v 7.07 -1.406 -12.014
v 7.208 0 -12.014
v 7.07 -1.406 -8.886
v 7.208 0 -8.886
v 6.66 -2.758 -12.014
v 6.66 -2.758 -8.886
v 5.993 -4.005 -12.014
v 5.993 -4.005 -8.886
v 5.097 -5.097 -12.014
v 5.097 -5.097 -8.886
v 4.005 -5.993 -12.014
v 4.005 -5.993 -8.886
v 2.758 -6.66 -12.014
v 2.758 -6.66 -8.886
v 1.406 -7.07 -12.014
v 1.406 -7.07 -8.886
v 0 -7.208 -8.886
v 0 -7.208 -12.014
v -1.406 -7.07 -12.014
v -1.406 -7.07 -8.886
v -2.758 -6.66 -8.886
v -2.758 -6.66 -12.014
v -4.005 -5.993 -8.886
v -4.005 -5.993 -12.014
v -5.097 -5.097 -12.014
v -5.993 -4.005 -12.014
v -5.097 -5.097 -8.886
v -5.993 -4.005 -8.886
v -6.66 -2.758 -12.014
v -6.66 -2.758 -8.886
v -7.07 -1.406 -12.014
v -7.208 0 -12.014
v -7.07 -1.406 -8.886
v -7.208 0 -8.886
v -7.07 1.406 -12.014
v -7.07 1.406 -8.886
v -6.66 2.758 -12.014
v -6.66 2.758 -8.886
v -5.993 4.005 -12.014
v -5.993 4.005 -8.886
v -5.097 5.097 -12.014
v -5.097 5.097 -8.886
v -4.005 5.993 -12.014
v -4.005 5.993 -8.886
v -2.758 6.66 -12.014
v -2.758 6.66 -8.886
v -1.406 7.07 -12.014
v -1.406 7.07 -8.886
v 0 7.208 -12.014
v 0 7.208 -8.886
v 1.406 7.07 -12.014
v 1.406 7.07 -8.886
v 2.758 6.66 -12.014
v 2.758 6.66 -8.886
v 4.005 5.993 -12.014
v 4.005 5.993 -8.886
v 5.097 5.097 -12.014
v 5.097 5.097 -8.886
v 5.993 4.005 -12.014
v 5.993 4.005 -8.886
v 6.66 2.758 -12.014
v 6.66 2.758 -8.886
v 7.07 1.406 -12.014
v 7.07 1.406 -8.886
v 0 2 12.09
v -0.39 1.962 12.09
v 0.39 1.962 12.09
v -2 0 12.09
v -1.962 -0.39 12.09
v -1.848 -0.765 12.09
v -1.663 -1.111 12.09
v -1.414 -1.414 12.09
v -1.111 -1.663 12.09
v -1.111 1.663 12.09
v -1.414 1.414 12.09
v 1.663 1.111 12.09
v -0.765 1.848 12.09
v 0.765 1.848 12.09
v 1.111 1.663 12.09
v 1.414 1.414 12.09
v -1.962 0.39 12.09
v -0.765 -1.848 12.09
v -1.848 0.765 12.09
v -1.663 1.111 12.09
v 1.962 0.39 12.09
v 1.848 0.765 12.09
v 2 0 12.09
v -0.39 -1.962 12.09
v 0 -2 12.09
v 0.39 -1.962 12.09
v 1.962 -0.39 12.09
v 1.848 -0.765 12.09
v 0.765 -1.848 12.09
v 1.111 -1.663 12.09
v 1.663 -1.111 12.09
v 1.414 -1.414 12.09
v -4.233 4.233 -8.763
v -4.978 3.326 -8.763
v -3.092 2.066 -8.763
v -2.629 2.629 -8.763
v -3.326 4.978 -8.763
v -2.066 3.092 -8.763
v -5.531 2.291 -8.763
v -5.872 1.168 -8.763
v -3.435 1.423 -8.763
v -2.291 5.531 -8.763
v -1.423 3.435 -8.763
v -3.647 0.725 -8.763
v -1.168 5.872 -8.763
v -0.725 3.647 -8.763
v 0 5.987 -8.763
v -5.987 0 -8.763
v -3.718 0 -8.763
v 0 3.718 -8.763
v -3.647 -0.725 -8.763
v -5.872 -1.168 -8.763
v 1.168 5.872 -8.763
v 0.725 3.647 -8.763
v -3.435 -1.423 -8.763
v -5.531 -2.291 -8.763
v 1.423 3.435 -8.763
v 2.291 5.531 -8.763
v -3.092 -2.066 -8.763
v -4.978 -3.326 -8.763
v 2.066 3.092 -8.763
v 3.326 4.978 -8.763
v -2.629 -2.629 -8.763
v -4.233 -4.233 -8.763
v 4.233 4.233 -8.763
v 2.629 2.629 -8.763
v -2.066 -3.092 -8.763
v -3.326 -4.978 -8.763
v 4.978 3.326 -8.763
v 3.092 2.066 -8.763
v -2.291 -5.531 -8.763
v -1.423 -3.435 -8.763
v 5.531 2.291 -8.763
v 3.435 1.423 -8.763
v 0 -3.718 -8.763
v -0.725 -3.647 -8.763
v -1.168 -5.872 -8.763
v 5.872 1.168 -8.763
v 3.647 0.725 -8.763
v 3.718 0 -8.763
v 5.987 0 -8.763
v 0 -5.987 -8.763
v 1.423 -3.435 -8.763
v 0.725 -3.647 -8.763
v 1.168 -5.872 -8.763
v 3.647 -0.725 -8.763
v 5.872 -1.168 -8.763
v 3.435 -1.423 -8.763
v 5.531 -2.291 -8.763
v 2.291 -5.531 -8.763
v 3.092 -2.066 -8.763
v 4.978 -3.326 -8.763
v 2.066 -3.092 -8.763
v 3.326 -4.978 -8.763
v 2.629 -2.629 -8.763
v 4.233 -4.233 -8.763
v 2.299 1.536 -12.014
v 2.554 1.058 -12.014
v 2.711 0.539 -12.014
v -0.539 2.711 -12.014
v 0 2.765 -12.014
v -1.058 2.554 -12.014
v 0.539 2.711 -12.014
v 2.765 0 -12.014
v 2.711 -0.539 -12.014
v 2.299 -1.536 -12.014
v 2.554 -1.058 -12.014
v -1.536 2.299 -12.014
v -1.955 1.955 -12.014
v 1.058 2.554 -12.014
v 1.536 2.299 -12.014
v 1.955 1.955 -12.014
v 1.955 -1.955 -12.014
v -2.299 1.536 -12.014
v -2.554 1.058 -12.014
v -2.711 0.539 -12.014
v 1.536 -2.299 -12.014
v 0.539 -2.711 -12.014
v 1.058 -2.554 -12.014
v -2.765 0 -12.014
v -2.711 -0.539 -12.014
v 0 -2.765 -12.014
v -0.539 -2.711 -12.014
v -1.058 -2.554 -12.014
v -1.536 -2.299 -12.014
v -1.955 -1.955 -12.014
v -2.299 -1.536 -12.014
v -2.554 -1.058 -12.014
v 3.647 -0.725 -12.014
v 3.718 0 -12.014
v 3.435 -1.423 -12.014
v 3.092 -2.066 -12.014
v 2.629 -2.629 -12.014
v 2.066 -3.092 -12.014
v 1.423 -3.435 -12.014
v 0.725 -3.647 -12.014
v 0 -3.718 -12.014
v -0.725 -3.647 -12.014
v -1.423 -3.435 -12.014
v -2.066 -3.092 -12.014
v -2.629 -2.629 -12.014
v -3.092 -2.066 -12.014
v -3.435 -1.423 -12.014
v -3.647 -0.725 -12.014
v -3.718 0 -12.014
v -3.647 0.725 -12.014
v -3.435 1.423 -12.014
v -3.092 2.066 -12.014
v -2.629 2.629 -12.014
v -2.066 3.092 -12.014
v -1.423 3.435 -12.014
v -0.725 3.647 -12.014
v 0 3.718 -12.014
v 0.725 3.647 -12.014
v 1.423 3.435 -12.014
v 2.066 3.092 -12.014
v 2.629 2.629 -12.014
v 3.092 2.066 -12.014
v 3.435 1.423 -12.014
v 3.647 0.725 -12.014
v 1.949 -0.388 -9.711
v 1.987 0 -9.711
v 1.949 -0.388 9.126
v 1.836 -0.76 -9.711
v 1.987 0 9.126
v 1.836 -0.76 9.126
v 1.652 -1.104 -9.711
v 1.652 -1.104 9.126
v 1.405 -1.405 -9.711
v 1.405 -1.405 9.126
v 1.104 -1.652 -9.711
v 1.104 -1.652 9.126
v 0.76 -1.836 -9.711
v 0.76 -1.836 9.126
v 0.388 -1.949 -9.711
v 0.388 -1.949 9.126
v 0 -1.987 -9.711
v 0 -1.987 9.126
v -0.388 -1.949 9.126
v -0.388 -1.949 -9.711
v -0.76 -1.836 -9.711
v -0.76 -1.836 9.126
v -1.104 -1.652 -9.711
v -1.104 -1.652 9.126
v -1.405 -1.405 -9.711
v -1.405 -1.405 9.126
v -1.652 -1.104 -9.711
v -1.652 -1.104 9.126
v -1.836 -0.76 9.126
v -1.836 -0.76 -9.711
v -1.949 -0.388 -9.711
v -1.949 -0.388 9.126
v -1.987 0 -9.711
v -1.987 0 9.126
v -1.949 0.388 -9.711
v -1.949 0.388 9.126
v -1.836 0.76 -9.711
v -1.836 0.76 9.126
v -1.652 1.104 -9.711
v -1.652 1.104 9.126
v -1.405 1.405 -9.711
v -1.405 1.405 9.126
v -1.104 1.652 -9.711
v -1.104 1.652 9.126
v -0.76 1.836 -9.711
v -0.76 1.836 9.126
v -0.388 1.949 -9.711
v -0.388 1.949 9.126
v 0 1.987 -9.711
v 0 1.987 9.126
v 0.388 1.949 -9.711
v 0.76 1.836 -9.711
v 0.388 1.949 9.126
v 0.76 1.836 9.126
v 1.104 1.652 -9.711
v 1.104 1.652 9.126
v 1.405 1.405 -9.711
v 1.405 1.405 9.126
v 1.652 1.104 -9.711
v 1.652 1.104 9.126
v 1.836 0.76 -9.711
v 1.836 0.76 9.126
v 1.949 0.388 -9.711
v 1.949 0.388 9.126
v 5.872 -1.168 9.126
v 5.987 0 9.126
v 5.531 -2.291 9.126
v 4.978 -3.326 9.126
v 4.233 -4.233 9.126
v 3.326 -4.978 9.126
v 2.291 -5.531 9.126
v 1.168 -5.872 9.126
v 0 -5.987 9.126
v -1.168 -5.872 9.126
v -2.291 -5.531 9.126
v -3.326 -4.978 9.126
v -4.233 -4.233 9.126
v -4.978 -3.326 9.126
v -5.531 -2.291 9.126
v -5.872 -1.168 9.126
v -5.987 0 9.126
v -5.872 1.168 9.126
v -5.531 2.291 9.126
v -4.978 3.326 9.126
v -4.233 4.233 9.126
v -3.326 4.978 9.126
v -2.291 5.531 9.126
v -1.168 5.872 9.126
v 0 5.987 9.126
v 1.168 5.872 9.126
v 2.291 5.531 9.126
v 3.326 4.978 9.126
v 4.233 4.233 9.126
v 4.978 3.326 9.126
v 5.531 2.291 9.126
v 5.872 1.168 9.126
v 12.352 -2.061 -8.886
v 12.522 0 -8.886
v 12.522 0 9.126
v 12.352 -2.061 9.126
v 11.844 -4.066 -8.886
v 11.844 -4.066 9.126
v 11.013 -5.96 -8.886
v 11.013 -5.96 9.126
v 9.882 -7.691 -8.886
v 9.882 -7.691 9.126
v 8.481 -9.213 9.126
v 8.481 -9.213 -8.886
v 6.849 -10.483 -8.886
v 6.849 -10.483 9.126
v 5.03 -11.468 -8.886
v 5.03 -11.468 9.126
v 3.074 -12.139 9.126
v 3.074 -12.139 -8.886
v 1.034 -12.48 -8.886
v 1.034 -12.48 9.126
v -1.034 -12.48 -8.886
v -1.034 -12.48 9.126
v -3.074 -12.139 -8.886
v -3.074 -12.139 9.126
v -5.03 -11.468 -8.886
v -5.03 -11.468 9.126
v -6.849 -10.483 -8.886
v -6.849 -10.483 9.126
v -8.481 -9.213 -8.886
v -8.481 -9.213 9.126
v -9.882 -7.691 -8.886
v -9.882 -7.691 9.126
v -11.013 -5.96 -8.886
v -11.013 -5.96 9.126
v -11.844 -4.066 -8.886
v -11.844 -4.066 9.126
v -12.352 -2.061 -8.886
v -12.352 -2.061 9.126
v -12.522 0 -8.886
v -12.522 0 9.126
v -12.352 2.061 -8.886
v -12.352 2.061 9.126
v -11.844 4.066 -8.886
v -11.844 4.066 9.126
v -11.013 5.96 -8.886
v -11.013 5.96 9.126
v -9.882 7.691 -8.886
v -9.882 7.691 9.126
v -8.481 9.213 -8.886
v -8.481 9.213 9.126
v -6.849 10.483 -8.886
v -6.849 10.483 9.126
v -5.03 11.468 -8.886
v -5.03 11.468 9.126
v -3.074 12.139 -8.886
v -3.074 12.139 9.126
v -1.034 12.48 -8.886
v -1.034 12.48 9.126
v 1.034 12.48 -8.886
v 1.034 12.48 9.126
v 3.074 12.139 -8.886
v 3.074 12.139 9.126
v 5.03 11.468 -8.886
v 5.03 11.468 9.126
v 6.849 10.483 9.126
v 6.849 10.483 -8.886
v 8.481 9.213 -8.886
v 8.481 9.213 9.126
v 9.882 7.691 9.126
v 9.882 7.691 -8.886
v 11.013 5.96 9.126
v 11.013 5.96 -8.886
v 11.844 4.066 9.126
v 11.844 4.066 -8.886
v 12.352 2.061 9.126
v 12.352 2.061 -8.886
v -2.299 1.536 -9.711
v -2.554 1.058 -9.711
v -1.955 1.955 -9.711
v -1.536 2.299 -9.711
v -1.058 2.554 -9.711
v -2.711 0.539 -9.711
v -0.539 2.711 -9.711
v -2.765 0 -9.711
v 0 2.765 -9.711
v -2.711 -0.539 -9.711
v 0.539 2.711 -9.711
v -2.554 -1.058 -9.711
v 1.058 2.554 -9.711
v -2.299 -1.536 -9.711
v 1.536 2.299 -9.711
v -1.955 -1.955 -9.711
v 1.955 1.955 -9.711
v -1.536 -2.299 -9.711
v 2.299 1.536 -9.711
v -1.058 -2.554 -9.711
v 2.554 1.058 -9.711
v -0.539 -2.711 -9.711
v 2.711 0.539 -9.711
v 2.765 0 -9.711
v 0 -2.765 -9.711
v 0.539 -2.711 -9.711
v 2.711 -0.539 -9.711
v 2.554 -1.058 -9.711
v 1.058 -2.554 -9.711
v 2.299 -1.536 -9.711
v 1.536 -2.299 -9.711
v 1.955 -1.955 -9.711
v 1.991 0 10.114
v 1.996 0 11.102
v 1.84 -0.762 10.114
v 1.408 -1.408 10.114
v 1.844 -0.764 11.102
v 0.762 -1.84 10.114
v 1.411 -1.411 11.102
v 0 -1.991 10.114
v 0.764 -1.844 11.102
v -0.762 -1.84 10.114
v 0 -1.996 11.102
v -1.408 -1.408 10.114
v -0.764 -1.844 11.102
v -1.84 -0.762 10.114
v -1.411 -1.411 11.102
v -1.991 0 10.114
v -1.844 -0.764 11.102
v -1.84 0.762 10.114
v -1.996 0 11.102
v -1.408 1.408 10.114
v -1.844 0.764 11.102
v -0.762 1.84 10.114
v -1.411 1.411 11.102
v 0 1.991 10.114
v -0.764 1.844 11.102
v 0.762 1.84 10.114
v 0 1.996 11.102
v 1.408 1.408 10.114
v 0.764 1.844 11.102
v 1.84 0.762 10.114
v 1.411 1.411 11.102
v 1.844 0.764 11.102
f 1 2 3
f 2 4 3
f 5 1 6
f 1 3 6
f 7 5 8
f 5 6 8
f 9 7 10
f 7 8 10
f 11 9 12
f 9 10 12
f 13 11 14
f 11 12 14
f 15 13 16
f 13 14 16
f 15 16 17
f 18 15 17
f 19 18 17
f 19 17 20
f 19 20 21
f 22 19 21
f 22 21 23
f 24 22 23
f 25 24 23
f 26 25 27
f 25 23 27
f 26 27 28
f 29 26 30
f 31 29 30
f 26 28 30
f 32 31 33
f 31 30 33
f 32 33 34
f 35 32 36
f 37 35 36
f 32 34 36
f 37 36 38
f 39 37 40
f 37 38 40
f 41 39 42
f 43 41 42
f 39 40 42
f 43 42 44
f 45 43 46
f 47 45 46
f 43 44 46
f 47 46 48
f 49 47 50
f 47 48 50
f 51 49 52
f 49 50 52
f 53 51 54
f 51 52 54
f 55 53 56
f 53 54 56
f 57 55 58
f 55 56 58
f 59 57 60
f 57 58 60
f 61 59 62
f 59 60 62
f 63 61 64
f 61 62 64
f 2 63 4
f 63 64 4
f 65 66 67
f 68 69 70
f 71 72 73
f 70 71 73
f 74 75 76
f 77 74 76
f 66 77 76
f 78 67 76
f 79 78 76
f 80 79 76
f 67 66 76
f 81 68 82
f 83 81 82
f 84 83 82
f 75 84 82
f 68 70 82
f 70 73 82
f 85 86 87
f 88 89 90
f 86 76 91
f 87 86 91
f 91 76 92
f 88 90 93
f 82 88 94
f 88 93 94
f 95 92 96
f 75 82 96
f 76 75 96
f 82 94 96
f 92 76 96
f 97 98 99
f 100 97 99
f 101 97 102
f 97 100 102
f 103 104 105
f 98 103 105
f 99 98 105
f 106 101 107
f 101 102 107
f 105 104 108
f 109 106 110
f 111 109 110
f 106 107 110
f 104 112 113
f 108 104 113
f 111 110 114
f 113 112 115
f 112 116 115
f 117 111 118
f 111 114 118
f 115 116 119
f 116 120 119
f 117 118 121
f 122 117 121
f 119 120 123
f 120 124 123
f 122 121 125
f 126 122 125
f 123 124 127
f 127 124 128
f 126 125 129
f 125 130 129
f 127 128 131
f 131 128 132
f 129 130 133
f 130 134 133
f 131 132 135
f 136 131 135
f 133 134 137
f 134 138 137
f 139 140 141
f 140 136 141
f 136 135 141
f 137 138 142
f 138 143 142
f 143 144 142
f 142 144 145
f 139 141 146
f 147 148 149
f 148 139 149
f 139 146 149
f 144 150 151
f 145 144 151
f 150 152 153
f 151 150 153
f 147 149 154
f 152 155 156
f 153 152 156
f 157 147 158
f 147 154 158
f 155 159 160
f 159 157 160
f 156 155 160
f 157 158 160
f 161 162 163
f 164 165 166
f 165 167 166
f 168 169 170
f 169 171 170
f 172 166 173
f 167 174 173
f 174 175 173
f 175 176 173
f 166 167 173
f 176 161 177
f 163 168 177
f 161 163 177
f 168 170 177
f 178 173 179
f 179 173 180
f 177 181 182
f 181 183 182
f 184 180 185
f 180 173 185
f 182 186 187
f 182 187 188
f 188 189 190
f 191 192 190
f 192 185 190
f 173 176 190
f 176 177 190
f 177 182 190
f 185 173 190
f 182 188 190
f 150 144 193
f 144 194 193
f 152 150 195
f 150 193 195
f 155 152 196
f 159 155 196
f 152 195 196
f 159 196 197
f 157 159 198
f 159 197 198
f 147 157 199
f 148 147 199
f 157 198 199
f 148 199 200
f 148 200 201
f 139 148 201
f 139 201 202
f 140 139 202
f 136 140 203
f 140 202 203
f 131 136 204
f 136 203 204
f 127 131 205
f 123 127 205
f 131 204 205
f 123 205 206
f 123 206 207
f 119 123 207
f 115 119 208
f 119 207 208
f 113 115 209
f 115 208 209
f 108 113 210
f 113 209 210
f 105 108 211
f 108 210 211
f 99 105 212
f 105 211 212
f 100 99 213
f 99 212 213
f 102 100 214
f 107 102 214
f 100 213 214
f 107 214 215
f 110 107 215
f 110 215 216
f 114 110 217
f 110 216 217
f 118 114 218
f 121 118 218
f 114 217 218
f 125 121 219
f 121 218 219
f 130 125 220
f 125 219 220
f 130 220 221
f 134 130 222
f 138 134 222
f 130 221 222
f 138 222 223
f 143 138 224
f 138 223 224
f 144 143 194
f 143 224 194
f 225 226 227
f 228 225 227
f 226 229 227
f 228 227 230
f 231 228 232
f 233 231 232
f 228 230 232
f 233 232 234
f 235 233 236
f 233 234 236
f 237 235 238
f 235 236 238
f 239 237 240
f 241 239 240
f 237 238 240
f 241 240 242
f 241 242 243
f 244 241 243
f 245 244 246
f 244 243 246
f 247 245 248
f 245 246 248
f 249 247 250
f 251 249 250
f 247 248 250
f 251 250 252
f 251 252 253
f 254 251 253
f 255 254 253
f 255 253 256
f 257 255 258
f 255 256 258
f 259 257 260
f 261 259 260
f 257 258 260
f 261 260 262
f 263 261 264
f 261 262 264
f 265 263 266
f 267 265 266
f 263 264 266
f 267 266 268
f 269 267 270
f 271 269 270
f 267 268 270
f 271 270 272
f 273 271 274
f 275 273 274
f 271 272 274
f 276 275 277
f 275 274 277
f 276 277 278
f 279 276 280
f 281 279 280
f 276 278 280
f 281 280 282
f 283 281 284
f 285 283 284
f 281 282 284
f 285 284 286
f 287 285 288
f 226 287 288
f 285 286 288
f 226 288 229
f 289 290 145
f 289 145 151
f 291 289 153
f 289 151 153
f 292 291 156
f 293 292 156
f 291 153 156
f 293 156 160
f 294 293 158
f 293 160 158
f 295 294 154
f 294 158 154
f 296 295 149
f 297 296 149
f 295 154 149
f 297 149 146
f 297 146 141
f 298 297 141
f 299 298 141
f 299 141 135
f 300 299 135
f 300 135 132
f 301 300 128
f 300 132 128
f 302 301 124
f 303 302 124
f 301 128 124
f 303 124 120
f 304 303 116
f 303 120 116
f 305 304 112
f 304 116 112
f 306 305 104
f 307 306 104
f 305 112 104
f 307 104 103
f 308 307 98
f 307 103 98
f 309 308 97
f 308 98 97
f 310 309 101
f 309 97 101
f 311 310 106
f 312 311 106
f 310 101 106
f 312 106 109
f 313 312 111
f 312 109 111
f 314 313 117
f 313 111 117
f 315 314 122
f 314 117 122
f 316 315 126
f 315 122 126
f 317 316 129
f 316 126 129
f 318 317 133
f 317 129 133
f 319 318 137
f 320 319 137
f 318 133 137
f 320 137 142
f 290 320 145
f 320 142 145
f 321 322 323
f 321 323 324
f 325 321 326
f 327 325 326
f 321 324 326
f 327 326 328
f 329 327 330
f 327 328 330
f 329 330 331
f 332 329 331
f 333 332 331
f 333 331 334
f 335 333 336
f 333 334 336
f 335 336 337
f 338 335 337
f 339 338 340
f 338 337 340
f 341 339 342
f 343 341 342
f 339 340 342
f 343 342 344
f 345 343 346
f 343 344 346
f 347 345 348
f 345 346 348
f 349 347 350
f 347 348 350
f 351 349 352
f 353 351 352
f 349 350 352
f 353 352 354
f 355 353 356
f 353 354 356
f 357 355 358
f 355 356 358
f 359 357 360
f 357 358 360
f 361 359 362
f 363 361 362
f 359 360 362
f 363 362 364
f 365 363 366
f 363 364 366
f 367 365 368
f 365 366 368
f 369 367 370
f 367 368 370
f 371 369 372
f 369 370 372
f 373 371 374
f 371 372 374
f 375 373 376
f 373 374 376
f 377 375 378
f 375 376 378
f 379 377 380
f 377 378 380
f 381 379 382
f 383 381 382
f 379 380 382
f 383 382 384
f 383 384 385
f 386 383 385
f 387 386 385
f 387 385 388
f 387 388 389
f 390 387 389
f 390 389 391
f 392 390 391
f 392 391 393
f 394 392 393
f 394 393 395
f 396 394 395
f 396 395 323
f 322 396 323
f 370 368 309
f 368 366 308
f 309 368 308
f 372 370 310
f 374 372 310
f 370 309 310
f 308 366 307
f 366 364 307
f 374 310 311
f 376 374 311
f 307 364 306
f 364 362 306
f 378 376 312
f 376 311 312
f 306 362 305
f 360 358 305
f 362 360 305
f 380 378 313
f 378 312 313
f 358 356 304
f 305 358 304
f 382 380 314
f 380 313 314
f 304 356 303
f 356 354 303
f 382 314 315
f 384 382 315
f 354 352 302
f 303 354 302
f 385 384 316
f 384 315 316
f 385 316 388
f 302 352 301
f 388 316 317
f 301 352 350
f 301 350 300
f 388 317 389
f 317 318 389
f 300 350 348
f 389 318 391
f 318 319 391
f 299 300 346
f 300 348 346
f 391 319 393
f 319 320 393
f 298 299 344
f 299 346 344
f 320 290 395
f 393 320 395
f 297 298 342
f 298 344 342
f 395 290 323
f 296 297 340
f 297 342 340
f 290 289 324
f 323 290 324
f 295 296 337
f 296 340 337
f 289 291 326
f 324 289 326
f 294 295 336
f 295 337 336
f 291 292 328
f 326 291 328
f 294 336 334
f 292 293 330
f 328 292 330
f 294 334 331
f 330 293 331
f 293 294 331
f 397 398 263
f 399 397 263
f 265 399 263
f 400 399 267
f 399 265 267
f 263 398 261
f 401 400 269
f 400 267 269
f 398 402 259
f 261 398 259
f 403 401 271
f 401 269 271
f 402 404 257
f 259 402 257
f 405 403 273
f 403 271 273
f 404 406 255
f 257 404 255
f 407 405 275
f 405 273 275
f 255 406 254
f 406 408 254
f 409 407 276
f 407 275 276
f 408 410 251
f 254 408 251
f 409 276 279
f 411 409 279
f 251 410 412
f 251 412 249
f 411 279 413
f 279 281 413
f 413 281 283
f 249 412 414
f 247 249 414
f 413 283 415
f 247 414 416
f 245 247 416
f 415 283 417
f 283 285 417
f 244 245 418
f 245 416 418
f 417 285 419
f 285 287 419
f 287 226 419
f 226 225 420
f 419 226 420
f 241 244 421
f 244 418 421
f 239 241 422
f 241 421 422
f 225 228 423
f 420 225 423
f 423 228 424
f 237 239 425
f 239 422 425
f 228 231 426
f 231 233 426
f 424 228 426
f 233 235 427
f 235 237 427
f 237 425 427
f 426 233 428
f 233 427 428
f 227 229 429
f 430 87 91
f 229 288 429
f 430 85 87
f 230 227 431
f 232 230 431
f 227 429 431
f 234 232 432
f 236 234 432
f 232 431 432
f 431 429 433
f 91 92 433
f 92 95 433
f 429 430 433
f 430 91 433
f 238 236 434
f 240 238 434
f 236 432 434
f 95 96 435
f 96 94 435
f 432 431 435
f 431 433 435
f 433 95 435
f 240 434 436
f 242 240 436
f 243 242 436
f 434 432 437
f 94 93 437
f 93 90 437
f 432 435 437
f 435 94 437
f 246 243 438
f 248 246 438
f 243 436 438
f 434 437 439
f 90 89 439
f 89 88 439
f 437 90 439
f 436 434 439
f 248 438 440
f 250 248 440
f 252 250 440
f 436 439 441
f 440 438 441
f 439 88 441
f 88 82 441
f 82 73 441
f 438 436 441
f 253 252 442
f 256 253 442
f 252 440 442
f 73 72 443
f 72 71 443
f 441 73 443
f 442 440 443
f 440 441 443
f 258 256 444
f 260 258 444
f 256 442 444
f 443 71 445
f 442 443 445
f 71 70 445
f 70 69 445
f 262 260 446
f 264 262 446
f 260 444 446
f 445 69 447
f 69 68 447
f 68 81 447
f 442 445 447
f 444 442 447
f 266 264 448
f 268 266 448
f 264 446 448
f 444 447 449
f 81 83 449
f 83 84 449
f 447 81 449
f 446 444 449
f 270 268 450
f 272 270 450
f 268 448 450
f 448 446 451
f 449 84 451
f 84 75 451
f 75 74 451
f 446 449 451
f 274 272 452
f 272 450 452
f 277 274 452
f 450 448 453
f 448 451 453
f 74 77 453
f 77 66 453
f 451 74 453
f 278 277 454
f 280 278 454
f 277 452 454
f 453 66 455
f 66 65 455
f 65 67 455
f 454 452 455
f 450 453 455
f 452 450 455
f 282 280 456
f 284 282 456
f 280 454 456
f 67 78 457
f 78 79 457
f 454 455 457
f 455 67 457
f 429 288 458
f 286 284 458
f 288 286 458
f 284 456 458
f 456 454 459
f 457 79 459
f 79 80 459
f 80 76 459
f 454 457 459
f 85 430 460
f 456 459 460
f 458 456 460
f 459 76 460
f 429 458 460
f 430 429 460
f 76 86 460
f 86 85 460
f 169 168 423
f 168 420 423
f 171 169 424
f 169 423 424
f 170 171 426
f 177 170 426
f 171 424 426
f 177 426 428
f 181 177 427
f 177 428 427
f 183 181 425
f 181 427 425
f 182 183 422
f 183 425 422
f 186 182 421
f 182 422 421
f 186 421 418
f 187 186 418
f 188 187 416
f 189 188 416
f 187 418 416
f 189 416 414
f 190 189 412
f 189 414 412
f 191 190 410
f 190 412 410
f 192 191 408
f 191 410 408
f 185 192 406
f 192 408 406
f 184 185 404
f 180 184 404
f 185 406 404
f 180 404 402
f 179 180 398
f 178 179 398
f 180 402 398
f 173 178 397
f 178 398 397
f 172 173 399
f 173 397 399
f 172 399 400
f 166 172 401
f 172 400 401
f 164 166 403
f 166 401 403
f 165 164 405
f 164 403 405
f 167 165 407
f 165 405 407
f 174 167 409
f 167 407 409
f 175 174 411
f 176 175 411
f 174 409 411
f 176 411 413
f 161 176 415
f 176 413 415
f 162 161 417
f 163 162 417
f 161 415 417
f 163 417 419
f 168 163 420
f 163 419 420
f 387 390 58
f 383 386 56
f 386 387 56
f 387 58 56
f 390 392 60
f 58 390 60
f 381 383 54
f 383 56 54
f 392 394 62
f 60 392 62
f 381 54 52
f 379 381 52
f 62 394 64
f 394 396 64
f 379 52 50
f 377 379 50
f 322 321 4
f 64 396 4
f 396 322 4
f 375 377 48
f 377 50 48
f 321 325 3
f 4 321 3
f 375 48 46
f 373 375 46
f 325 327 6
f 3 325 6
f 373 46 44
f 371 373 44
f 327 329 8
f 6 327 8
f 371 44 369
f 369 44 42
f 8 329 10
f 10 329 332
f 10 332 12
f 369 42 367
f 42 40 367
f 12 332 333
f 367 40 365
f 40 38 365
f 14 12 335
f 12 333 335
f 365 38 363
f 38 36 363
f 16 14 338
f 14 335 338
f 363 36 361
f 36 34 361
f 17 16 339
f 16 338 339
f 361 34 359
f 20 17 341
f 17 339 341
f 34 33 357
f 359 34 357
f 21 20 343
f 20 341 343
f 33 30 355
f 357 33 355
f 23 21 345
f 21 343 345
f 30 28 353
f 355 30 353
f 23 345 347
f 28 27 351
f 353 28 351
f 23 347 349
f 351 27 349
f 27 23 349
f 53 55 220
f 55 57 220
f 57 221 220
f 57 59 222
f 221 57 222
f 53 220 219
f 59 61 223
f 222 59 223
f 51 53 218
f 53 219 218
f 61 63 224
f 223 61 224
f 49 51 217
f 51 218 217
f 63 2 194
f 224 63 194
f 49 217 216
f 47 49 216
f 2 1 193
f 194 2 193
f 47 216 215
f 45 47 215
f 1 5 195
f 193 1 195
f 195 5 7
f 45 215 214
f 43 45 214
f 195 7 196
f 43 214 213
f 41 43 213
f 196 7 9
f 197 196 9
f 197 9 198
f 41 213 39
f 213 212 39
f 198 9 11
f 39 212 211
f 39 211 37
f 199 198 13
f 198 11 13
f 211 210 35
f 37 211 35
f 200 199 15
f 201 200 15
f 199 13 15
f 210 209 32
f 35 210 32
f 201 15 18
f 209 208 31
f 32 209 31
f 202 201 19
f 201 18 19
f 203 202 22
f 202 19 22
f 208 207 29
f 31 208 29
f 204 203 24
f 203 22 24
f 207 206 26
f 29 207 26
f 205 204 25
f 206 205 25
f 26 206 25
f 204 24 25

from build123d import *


with BuildPart() as f1:
    # F0 (on Front) → F1 (revolve)
    with BuildSketch(Plane.XZ):
        Polygon((3.718241, -8.763036), (3.718241, -12.013727), (7.208238, -12.013727), (7.208238, -8.886344), (12.522305, -8.886344), (12.522305, 9.126479), (5.986845, 9.126479), (5.986845, -8.763036), align=None)
    revolve(axis=Axis((0, 0, 0.038139), (0, 0, -1)))


with BuildPart() as f2:
    # F0 (on Front) → F2 (revolve)
    with BuildSketch(Plane.XZ):
        Polygon((2, 12.090005), (0, 12.090005), (0, -12.013727), (2.764514, -12.013727), (2.764514, -9.711034), (1.986845, -9.711034), (1.986845, 9.126479), align=None)
    revolve(axis=Axis((0, 0, 0.038139), (0, 0, -1)))


solid = Compound([f1.part, f2.part])
